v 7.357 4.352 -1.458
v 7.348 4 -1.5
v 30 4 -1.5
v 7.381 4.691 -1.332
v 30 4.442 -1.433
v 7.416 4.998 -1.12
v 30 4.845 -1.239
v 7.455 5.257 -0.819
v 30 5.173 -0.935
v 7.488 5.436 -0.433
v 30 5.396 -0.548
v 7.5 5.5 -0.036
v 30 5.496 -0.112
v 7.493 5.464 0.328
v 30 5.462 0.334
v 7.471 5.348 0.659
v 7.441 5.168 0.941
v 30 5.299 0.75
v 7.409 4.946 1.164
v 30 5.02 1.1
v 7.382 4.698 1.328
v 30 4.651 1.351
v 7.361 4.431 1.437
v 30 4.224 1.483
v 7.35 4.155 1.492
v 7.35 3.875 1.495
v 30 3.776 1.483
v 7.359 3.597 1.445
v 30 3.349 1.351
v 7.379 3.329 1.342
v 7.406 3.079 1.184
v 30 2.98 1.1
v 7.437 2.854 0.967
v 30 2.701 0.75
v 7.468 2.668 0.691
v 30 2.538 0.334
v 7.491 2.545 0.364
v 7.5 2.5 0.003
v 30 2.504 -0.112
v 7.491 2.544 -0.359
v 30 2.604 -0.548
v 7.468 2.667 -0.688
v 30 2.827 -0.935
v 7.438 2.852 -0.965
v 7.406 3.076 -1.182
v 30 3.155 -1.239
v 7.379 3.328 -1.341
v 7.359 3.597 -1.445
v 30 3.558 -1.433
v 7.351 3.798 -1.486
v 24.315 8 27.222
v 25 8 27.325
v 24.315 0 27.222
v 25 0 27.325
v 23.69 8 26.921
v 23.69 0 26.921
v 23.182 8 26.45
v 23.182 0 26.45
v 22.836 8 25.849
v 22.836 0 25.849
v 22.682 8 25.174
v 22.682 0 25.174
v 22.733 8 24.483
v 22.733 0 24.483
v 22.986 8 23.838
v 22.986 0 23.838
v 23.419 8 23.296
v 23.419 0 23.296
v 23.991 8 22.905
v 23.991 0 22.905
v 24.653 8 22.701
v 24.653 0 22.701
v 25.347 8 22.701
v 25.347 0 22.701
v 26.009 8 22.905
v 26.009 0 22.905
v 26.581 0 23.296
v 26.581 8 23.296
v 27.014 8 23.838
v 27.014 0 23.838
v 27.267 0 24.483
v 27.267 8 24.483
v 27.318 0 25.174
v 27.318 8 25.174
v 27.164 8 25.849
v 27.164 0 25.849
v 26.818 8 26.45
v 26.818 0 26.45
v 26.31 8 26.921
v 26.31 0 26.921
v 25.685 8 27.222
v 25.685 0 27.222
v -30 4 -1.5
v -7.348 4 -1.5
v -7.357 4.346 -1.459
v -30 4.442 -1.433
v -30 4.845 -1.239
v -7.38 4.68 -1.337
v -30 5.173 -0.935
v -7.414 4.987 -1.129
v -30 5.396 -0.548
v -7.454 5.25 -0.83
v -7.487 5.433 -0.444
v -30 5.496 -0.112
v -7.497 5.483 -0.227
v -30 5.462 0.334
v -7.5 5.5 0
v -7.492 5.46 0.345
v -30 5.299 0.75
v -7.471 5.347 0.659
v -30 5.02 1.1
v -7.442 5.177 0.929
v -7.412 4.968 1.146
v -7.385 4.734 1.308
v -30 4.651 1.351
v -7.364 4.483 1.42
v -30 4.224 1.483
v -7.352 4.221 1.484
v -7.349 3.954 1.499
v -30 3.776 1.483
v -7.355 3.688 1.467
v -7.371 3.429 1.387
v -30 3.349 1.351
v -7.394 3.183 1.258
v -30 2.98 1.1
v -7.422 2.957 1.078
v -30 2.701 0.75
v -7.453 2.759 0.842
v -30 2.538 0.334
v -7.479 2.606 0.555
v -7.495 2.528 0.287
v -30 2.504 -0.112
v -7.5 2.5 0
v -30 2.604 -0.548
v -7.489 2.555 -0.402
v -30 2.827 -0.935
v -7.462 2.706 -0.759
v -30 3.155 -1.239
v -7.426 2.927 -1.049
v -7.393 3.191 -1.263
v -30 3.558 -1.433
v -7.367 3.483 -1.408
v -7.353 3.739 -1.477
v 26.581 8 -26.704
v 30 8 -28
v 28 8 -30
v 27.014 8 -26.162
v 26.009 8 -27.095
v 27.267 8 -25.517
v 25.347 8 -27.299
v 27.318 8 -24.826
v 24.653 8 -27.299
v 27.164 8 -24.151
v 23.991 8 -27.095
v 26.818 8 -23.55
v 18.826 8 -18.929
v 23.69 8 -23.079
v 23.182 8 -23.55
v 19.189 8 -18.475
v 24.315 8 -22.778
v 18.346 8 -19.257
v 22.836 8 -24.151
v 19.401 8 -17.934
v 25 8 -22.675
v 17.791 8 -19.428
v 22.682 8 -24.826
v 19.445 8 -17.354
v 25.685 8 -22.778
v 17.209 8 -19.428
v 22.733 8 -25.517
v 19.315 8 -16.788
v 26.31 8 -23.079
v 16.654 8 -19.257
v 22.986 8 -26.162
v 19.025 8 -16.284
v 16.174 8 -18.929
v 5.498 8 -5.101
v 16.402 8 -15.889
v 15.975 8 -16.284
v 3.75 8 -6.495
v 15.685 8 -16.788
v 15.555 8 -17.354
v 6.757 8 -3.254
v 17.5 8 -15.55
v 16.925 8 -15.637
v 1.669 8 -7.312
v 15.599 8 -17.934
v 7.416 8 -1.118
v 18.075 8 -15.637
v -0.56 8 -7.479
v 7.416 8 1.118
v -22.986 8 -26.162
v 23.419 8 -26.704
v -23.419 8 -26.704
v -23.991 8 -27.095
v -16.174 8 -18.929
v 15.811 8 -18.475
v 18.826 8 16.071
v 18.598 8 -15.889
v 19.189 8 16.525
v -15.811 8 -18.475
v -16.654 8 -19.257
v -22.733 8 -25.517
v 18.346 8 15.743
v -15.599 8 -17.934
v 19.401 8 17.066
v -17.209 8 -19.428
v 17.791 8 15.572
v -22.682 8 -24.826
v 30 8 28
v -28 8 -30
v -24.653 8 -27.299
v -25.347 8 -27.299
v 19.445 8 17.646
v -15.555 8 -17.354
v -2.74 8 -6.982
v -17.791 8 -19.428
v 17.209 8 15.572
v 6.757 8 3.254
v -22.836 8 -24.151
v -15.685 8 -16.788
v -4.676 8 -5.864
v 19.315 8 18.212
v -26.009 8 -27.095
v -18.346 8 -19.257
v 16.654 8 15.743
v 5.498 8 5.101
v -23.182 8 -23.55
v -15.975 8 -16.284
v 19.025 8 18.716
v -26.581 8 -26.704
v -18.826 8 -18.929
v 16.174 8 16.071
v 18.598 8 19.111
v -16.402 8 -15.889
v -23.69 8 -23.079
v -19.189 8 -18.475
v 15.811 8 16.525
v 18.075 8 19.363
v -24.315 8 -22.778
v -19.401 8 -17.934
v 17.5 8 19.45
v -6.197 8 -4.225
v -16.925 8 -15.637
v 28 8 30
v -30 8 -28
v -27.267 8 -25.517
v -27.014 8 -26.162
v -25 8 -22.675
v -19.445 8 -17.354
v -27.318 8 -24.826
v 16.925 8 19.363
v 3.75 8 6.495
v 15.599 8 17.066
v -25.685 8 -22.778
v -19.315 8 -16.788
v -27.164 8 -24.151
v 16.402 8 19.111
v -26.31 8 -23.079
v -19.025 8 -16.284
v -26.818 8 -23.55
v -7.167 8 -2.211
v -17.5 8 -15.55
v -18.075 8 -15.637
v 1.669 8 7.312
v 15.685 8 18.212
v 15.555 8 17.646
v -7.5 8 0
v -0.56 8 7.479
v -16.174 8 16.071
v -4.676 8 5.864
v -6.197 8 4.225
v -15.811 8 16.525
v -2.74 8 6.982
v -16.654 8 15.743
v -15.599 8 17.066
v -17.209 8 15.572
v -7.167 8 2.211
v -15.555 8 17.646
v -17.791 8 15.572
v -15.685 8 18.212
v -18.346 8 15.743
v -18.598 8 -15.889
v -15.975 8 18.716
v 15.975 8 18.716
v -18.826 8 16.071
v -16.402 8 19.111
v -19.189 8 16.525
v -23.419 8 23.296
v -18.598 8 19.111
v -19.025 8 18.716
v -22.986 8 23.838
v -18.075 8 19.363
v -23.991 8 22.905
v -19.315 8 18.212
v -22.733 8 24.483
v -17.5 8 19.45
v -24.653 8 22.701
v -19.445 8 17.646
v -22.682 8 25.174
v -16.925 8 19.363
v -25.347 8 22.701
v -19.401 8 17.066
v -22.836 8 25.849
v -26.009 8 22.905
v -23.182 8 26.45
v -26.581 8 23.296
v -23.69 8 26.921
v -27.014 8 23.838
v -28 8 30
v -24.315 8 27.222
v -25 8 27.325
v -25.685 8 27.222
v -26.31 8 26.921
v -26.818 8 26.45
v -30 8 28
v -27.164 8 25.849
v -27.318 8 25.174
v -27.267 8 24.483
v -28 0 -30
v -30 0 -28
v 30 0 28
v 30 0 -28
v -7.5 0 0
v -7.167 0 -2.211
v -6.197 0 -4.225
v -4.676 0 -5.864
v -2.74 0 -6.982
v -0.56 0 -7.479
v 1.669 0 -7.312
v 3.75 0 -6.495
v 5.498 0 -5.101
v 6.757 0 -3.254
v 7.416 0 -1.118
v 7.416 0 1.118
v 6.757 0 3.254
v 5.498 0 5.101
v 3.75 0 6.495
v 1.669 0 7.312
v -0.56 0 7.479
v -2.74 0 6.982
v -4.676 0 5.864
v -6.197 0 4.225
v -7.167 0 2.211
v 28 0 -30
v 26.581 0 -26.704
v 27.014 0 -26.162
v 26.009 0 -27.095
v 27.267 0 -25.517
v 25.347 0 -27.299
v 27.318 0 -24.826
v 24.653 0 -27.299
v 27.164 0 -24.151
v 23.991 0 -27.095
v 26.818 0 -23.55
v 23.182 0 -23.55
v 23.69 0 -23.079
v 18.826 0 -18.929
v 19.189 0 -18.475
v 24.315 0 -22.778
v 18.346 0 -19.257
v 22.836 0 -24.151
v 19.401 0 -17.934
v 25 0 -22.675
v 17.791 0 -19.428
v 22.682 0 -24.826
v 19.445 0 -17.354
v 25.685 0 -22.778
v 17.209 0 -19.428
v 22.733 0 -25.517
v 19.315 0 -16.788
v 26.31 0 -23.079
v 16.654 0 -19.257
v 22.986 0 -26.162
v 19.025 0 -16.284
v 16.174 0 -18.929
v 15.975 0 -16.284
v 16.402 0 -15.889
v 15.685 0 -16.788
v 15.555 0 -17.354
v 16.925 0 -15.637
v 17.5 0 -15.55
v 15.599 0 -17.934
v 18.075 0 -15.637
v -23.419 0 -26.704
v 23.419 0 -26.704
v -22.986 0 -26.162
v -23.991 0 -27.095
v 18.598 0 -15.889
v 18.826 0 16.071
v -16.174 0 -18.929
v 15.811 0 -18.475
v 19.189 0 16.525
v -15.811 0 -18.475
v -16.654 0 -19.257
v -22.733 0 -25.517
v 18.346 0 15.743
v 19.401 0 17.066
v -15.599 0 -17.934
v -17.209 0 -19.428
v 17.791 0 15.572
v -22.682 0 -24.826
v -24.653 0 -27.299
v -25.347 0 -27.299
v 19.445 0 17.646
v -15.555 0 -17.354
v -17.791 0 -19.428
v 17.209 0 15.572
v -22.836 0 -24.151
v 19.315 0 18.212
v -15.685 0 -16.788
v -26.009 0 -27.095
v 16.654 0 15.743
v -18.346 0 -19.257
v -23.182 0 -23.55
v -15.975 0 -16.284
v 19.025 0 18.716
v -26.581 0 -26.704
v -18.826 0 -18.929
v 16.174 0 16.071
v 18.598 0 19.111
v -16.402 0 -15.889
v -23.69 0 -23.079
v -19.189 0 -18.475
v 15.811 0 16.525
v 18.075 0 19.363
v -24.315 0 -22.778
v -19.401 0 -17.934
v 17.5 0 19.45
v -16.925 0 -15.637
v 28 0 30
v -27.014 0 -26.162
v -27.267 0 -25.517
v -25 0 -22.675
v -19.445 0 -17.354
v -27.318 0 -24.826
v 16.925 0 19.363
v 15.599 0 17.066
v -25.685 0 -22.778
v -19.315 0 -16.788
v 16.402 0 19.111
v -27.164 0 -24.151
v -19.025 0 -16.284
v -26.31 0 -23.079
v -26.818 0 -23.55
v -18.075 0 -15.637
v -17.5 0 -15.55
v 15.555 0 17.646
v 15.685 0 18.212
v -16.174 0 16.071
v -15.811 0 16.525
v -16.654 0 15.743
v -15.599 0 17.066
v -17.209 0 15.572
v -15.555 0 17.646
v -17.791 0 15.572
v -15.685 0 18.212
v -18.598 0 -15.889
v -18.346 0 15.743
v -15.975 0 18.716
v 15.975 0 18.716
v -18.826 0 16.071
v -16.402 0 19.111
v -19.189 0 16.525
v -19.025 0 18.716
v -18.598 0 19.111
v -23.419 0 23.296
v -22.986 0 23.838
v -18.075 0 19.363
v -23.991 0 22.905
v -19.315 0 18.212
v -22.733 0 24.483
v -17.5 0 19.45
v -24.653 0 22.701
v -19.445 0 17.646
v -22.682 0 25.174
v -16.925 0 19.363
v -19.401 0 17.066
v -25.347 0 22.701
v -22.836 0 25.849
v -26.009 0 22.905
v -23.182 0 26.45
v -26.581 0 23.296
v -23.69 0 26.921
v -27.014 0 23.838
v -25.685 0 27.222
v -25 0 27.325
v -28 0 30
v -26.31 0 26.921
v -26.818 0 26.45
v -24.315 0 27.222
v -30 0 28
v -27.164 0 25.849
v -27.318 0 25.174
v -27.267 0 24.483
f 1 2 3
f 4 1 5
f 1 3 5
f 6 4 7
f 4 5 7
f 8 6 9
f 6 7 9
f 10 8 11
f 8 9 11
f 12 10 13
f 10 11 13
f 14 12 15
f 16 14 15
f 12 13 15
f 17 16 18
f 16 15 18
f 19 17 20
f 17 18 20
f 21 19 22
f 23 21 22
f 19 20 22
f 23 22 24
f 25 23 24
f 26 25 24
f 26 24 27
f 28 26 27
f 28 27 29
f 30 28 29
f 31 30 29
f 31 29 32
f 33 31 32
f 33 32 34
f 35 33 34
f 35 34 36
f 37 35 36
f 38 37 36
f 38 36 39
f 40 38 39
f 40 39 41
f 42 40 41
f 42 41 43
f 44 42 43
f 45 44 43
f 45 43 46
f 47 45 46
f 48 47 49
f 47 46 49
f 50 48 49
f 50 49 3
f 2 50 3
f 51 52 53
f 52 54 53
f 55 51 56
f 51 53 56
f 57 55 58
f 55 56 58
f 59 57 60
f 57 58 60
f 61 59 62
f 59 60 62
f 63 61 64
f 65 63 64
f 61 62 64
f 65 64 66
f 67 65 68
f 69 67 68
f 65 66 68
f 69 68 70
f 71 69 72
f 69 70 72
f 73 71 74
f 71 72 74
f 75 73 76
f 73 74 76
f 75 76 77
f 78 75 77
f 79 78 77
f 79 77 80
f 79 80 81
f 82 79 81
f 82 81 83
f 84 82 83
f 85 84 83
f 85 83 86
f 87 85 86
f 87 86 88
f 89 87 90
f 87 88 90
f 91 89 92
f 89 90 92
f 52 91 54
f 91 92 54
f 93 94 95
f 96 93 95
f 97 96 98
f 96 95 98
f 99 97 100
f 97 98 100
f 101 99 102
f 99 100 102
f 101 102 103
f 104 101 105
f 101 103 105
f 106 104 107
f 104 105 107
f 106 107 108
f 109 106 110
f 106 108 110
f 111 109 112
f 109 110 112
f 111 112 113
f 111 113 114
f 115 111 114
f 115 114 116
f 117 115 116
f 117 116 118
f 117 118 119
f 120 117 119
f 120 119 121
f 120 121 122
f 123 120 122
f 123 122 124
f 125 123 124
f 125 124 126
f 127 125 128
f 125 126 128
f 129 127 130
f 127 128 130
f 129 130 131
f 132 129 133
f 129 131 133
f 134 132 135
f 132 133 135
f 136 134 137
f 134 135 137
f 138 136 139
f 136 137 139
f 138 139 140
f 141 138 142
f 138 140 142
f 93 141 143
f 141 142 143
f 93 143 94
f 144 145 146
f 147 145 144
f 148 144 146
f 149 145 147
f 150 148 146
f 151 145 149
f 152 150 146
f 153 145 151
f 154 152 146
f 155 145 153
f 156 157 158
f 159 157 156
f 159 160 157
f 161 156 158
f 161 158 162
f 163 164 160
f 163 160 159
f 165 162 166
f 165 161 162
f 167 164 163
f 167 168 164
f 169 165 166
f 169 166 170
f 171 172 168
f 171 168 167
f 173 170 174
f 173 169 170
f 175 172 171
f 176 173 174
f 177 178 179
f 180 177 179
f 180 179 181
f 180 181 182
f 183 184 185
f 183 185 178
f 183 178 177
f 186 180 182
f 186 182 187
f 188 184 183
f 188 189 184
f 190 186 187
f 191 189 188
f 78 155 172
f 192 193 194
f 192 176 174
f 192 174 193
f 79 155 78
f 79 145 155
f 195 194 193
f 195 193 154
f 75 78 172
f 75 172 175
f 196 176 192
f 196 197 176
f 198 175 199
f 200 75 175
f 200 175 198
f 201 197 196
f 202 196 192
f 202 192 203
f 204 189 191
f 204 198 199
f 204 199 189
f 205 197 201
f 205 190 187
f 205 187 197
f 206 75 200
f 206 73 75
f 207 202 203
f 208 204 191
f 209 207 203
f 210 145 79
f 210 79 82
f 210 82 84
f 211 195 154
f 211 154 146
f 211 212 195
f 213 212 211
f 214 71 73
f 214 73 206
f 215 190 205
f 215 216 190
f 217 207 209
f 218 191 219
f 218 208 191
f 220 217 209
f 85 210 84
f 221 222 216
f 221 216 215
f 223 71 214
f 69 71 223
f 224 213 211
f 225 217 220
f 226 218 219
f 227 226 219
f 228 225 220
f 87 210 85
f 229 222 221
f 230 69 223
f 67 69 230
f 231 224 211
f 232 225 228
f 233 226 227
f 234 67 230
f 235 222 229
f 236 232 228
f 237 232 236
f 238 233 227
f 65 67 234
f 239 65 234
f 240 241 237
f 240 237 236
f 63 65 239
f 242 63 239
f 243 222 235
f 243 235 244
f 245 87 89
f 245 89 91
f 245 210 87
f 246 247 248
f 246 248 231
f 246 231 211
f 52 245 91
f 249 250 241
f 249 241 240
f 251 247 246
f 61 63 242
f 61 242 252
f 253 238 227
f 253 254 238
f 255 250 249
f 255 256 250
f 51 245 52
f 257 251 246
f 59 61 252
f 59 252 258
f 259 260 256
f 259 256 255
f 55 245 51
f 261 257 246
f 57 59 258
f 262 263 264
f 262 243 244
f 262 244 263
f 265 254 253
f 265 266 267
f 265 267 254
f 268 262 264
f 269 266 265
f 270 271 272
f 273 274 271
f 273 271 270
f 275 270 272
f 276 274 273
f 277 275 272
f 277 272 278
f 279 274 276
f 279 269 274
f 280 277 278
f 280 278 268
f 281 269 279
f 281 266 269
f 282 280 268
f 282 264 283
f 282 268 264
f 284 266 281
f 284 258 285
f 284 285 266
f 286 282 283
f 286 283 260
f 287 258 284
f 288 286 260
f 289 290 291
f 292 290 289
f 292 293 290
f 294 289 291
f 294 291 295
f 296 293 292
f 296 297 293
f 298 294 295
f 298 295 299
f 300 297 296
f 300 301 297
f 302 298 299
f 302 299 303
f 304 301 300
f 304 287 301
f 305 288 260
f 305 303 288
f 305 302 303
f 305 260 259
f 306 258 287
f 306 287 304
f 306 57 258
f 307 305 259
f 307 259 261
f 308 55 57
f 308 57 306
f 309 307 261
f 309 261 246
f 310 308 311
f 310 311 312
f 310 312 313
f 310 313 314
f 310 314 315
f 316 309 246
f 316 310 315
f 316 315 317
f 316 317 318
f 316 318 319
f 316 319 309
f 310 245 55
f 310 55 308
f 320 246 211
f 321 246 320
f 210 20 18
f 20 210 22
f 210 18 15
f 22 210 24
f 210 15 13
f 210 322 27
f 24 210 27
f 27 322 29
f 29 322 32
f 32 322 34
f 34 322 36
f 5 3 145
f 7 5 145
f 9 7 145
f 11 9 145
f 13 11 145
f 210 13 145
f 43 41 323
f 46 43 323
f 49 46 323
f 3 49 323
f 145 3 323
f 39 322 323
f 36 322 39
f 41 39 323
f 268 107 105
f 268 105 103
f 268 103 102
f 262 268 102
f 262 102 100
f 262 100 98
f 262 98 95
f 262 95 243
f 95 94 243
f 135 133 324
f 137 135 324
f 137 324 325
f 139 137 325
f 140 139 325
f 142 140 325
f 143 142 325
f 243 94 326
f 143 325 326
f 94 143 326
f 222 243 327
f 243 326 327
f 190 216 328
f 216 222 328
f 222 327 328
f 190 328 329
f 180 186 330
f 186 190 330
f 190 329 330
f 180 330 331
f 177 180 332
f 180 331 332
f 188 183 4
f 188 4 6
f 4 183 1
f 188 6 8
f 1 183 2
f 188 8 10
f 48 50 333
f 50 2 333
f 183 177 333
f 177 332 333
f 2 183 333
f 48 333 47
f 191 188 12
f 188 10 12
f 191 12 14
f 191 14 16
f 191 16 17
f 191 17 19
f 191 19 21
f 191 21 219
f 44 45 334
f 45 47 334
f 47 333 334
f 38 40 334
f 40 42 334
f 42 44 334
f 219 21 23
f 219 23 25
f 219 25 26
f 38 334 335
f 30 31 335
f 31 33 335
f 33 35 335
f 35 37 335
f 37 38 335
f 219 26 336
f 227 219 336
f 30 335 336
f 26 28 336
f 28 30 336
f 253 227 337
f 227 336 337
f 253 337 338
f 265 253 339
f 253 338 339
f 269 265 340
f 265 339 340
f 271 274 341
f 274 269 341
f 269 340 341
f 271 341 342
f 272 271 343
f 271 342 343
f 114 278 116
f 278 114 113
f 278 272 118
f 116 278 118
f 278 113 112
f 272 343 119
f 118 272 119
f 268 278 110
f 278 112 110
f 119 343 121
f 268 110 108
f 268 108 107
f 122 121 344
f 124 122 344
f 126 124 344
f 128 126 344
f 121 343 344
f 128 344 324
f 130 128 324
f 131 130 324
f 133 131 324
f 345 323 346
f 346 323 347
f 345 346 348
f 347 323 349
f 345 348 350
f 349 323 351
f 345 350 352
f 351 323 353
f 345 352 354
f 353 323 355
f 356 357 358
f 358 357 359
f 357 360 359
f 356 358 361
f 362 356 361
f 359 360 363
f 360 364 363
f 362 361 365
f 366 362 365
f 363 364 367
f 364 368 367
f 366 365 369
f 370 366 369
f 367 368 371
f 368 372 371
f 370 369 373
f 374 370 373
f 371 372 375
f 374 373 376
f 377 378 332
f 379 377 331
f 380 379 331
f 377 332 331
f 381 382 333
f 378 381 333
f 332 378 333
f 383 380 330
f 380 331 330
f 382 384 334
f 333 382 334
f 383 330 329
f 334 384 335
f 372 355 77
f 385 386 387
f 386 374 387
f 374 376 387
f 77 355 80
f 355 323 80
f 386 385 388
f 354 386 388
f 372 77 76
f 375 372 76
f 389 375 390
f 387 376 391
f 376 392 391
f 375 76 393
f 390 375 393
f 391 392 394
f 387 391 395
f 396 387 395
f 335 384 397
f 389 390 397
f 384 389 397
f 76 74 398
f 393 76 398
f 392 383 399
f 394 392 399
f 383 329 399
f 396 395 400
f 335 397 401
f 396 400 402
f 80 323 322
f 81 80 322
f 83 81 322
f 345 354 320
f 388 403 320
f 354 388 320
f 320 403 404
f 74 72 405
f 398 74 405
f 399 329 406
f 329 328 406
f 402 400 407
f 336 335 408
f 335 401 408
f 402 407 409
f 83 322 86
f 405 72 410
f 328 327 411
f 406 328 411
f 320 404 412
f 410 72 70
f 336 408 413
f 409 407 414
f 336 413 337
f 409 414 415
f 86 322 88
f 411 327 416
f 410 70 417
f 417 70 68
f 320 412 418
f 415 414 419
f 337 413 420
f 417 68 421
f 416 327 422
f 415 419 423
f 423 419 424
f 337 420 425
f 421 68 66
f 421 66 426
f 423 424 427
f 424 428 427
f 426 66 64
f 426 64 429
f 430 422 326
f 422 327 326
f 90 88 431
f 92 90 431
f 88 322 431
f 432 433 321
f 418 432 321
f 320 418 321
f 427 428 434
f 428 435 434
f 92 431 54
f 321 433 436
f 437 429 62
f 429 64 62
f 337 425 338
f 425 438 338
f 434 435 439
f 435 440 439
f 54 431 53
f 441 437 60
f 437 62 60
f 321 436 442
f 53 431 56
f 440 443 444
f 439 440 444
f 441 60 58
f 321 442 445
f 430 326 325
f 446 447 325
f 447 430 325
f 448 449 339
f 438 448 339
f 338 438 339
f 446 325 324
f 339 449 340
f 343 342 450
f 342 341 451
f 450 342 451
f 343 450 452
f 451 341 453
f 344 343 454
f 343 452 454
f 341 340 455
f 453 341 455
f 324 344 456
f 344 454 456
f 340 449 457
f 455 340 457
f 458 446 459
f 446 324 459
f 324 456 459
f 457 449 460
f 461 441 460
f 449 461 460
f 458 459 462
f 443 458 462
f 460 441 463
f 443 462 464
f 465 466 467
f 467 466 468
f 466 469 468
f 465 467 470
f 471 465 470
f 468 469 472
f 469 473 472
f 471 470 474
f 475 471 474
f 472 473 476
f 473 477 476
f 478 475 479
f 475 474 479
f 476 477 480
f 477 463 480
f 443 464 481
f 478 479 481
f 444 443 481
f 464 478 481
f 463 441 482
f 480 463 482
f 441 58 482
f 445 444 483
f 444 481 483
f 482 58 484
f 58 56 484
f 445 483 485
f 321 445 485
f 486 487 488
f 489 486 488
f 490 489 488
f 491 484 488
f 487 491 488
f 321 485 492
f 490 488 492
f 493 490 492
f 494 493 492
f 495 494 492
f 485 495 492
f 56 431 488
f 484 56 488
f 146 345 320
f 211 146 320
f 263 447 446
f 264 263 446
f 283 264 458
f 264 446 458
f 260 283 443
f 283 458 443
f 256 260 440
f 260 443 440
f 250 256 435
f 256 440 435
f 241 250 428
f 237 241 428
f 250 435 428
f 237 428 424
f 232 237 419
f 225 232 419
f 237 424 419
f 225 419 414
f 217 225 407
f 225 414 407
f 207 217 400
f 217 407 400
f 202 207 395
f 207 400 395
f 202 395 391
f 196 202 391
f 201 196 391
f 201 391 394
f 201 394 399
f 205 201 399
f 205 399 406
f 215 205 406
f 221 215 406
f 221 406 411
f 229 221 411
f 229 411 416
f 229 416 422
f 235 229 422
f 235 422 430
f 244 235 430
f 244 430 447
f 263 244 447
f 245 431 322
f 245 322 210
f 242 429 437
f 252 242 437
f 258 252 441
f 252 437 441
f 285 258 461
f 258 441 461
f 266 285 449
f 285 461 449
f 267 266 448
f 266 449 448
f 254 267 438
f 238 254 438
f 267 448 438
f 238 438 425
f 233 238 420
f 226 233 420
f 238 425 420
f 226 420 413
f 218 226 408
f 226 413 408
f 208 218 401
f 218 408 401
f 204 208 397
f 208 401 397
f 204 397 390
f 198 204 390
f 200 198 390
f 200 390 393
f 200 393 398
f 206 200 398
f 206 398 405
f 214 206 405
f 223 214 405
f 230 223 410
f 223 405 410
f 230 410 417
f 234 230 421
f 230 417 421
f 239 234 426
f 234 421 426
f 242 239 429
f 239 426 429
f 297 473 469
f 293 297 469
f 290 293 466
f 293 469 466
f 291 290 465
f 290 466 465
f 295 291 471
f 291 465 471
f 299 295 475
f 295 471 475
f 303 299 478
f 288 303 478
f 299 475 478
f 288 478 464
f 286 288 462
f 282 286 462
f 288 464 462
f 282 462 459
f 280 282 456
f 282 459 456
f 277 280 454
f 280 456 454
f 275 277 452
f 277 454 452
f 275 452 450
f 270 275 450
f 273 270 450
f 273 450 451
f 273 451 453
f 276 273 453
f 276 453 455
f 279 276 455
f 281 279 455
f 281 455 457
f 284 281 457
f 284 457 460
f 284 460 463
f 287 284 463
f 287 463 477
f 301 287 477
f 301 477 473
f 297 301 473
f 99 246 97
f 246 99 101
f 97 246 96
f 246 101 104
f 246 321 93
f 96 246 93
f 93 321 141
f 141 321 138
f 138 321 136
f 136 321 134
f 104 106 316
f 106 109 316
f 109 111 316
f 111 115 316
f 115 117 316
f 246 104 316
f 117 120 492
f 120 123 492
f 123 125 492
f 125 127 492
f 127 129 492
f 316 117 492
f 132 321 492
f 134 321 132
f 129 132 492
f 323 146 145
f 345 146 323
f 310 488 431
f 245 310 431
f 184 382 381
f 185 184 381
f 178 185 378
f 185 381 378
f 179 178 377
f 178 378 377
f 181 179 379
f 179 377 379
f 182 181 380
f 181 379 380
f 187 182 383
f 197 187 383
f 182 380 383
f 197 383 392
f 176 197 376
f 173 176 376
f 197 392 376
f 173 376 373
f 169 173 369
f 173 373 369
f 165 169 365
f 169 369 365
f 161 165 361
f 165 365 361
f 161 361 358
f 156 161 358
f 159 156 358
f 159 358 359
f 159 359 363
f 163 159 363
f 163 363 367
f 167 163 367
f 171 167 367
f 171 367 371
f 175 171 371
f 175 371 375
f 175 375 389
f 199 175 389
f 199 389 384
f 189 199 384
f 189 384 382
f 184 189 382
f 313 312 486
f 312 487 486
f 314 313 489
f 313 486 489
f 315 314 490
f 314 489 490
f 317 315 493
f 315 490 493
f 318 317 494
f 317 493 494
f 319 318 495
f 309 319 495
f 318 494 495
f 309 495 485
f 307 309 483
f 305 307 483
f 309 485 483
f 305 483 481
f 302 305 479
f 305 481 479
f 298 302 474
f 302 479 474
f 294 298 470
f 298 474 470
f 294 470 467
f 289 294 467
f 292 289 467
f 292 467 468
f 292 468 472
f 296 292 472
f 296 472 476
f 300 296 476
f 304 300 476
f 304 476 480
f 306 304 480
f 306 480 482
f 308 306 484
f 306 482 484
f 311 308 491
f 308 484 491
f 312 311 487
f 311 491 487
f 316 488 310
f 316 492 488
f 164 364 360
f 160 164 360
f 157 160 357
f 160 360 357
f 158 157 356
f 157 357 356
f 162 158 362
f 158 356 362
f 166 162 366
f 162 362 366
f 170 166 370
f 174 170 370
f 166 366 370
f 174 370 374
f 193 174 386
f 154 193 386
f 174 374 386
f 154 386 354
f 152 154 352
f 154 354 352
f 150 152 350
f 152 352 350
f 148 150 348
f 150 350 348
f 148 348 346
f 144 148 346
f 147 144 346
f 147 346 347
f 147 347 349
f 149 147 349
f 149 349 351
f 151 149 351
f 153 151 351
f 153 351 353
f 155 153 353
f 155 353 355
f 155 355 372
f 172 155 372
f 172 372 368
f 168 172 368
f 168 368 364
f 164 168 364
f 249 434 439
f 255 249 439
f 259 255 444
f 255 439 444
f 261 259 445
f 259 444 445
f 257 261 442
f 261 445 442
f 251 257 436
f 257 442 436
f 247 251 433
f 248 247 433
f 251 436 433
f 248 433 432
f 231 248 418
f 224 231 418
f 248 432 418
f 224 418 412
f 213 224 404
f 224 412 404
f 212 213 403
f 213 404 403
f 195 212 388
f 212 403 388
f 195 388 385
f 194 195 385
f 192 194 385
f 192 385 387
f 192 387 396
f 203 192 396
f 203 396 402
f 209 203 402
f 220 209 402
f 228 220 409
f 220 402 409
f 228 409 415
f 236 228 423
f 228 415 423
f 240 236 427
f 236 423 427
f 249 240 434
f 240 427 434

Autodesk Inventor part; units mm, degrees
ref_plane "YZ Plane" through (0, 0, 0) normal (1, 0, 0) x (0, 1, 0)
ref_plane "XZ Plane" through (0, 0, 0) normal (0, 1, 0) x (-1, 0, 0)
ref_plane "XY Plane" through (0, 0, 0) normal (0, 0, 1) x (1, 0, 0)
sketch "Sketch1" plane through (0, 0, 0) normal (0, 1, 0) x (-1, 0, 0)
  line L0 (-30, -30) -> (30, -30)
  line L1 (30, -30) -> (30, 30)
  line L2 (30, 30) -> (-30, 30)
  line L3 (-30, 30) -> (-30, -30)
  line L4 (-30, -30) -> (30, 30) construction
  line L5 (30, -30) -> (-30, 30) construction
  circle A0 centre (0, 0) radius 7.5
  dimension "d0" = 60
  dimension "d1" = 60
  dimension "d13" = 15
extrude "Extrusion1" add sketch "Sketch1" along normal blind 8
sketch "Sketch2" plane through (0, 8, 0) normal (0, 1, 0) x (1, 0, 0)
  line L0 (30, 30) -> (-30, 30) projected
  line L1 (-30, 30) -> (-30, -30) projected
  line L2 (-30, -30) -> (30, -30) projected
  line L3 (30, -30) -> (30, 30) projected
  line L4 (17.5, -17.5) -> (-17.5, -17.5)
  line L5 (-17.5, -17.5) -> (-17.5, 17.5)
  line L6 (-17.5, 17.5) -> (17.5, 17.5)
  line L7 (17.5, 17.5) -> (17.5, -17.5)
  line L8 (17.5, -17.5) -> (-17.5, 17.5) construction
  line L9 (-17.5, -17.5) -> (17.5, 17.5) construction
  line L10 (0, -17.5) -> (0, 17.5)
  line L11 (-17.5, 0) -> (17.5, 0)
  point P0 (0, 0)
  dimension "d4" = 35
  dimension "d5" = 35
hole "Hole1" at (-17.5, 8, 17.5) at (-17.5, 8, -17.5) at (17.5, 8, -17.5) at (17.5, 8, 17.5) direction (0, -1, 0) diameter 3.9 depth 10 tip angle 118
chamfer "Chamfer1" distance 2 angle 45 4 edges at (30, 4, 30) (30, 4, -30) (-30, 4, -30) (-30, 4, 30)
sketch "Sketch3" plane through (0, 8, 0) normal (0, 1, 0) x (1, 0, 0)
  line L0 (-28, -30) -> (-30, -28) projected
  line L1 (-28, -30) -> (28, -30) projected
  line L2 (30, -28) -> (28, -30) projected
  line L3 (30, -28) -> (30, 28) projected
  line L4 (28, 30) -> (30, 28) projected
  line L5 (28, 30) -> (-28, 30) projected
  line L6 (-30, 28) -> (-28, 30) projected
  line L7 (-30, 28) -> (-30, -28) projected
  circle A0 centre (17.5, 17.5) radius 1.95 projected
  circle A1 centre (-17.5, -17.5) radius 1.95 projected
  circle A2 centre (-17.5, 17.5) radius 1.95 projected
  circle A3 centre (17.5, -17.5) radius 1.95 projected
  circle A4 centre (0, 0) radius 7.5 projected
  line L8 (25, -25) -> (-25, -25)
  line L9 (-25, -25) -> (-25, 25)
  line L10 (-25, 25) -> (25, 25)
  line L11 (25, 25) -> (25, -25)
  line L12 (25, -25) -> (-25, 25) construction
  line L13 (-25, -25) -> (25, 25) construction
  dimension "d17" = 50
  dimension "d18" = 50
hole "Hole2" at (-25, 8, -25) at (25, 8, -25) at (25, 8, 25) at (-25, 8, 25) direction (0, -1, 0) diameter 4.65 end through all
sketch "Sketch4" plane through (30, 0, 28) normal (1, 0, 0) x (0, 0, -1)
  line L0 (56, 8) -> (56, 0) projected
  line L1 (0, 8) -> (56, 8) projected
  line L2 (0, 0) -> (0, 8) projected
  line L3 (0, 0) -> (56, 0) projected
  circle A0 centre (28, 4) radius 1.5
  line L4 (-2, 8) -> (-2, 0) projected
  point P0 (28, 0)
  dimension "d26" = 3
  dimension "d27" = 4
  dimension "d28" = 30
extrude "Extrusion2" cut sketch "Sketch4" against normal through all contours A0
properties part number "00_XY_stage-CHUO_SEIKI_LD-647-R1-Top"
